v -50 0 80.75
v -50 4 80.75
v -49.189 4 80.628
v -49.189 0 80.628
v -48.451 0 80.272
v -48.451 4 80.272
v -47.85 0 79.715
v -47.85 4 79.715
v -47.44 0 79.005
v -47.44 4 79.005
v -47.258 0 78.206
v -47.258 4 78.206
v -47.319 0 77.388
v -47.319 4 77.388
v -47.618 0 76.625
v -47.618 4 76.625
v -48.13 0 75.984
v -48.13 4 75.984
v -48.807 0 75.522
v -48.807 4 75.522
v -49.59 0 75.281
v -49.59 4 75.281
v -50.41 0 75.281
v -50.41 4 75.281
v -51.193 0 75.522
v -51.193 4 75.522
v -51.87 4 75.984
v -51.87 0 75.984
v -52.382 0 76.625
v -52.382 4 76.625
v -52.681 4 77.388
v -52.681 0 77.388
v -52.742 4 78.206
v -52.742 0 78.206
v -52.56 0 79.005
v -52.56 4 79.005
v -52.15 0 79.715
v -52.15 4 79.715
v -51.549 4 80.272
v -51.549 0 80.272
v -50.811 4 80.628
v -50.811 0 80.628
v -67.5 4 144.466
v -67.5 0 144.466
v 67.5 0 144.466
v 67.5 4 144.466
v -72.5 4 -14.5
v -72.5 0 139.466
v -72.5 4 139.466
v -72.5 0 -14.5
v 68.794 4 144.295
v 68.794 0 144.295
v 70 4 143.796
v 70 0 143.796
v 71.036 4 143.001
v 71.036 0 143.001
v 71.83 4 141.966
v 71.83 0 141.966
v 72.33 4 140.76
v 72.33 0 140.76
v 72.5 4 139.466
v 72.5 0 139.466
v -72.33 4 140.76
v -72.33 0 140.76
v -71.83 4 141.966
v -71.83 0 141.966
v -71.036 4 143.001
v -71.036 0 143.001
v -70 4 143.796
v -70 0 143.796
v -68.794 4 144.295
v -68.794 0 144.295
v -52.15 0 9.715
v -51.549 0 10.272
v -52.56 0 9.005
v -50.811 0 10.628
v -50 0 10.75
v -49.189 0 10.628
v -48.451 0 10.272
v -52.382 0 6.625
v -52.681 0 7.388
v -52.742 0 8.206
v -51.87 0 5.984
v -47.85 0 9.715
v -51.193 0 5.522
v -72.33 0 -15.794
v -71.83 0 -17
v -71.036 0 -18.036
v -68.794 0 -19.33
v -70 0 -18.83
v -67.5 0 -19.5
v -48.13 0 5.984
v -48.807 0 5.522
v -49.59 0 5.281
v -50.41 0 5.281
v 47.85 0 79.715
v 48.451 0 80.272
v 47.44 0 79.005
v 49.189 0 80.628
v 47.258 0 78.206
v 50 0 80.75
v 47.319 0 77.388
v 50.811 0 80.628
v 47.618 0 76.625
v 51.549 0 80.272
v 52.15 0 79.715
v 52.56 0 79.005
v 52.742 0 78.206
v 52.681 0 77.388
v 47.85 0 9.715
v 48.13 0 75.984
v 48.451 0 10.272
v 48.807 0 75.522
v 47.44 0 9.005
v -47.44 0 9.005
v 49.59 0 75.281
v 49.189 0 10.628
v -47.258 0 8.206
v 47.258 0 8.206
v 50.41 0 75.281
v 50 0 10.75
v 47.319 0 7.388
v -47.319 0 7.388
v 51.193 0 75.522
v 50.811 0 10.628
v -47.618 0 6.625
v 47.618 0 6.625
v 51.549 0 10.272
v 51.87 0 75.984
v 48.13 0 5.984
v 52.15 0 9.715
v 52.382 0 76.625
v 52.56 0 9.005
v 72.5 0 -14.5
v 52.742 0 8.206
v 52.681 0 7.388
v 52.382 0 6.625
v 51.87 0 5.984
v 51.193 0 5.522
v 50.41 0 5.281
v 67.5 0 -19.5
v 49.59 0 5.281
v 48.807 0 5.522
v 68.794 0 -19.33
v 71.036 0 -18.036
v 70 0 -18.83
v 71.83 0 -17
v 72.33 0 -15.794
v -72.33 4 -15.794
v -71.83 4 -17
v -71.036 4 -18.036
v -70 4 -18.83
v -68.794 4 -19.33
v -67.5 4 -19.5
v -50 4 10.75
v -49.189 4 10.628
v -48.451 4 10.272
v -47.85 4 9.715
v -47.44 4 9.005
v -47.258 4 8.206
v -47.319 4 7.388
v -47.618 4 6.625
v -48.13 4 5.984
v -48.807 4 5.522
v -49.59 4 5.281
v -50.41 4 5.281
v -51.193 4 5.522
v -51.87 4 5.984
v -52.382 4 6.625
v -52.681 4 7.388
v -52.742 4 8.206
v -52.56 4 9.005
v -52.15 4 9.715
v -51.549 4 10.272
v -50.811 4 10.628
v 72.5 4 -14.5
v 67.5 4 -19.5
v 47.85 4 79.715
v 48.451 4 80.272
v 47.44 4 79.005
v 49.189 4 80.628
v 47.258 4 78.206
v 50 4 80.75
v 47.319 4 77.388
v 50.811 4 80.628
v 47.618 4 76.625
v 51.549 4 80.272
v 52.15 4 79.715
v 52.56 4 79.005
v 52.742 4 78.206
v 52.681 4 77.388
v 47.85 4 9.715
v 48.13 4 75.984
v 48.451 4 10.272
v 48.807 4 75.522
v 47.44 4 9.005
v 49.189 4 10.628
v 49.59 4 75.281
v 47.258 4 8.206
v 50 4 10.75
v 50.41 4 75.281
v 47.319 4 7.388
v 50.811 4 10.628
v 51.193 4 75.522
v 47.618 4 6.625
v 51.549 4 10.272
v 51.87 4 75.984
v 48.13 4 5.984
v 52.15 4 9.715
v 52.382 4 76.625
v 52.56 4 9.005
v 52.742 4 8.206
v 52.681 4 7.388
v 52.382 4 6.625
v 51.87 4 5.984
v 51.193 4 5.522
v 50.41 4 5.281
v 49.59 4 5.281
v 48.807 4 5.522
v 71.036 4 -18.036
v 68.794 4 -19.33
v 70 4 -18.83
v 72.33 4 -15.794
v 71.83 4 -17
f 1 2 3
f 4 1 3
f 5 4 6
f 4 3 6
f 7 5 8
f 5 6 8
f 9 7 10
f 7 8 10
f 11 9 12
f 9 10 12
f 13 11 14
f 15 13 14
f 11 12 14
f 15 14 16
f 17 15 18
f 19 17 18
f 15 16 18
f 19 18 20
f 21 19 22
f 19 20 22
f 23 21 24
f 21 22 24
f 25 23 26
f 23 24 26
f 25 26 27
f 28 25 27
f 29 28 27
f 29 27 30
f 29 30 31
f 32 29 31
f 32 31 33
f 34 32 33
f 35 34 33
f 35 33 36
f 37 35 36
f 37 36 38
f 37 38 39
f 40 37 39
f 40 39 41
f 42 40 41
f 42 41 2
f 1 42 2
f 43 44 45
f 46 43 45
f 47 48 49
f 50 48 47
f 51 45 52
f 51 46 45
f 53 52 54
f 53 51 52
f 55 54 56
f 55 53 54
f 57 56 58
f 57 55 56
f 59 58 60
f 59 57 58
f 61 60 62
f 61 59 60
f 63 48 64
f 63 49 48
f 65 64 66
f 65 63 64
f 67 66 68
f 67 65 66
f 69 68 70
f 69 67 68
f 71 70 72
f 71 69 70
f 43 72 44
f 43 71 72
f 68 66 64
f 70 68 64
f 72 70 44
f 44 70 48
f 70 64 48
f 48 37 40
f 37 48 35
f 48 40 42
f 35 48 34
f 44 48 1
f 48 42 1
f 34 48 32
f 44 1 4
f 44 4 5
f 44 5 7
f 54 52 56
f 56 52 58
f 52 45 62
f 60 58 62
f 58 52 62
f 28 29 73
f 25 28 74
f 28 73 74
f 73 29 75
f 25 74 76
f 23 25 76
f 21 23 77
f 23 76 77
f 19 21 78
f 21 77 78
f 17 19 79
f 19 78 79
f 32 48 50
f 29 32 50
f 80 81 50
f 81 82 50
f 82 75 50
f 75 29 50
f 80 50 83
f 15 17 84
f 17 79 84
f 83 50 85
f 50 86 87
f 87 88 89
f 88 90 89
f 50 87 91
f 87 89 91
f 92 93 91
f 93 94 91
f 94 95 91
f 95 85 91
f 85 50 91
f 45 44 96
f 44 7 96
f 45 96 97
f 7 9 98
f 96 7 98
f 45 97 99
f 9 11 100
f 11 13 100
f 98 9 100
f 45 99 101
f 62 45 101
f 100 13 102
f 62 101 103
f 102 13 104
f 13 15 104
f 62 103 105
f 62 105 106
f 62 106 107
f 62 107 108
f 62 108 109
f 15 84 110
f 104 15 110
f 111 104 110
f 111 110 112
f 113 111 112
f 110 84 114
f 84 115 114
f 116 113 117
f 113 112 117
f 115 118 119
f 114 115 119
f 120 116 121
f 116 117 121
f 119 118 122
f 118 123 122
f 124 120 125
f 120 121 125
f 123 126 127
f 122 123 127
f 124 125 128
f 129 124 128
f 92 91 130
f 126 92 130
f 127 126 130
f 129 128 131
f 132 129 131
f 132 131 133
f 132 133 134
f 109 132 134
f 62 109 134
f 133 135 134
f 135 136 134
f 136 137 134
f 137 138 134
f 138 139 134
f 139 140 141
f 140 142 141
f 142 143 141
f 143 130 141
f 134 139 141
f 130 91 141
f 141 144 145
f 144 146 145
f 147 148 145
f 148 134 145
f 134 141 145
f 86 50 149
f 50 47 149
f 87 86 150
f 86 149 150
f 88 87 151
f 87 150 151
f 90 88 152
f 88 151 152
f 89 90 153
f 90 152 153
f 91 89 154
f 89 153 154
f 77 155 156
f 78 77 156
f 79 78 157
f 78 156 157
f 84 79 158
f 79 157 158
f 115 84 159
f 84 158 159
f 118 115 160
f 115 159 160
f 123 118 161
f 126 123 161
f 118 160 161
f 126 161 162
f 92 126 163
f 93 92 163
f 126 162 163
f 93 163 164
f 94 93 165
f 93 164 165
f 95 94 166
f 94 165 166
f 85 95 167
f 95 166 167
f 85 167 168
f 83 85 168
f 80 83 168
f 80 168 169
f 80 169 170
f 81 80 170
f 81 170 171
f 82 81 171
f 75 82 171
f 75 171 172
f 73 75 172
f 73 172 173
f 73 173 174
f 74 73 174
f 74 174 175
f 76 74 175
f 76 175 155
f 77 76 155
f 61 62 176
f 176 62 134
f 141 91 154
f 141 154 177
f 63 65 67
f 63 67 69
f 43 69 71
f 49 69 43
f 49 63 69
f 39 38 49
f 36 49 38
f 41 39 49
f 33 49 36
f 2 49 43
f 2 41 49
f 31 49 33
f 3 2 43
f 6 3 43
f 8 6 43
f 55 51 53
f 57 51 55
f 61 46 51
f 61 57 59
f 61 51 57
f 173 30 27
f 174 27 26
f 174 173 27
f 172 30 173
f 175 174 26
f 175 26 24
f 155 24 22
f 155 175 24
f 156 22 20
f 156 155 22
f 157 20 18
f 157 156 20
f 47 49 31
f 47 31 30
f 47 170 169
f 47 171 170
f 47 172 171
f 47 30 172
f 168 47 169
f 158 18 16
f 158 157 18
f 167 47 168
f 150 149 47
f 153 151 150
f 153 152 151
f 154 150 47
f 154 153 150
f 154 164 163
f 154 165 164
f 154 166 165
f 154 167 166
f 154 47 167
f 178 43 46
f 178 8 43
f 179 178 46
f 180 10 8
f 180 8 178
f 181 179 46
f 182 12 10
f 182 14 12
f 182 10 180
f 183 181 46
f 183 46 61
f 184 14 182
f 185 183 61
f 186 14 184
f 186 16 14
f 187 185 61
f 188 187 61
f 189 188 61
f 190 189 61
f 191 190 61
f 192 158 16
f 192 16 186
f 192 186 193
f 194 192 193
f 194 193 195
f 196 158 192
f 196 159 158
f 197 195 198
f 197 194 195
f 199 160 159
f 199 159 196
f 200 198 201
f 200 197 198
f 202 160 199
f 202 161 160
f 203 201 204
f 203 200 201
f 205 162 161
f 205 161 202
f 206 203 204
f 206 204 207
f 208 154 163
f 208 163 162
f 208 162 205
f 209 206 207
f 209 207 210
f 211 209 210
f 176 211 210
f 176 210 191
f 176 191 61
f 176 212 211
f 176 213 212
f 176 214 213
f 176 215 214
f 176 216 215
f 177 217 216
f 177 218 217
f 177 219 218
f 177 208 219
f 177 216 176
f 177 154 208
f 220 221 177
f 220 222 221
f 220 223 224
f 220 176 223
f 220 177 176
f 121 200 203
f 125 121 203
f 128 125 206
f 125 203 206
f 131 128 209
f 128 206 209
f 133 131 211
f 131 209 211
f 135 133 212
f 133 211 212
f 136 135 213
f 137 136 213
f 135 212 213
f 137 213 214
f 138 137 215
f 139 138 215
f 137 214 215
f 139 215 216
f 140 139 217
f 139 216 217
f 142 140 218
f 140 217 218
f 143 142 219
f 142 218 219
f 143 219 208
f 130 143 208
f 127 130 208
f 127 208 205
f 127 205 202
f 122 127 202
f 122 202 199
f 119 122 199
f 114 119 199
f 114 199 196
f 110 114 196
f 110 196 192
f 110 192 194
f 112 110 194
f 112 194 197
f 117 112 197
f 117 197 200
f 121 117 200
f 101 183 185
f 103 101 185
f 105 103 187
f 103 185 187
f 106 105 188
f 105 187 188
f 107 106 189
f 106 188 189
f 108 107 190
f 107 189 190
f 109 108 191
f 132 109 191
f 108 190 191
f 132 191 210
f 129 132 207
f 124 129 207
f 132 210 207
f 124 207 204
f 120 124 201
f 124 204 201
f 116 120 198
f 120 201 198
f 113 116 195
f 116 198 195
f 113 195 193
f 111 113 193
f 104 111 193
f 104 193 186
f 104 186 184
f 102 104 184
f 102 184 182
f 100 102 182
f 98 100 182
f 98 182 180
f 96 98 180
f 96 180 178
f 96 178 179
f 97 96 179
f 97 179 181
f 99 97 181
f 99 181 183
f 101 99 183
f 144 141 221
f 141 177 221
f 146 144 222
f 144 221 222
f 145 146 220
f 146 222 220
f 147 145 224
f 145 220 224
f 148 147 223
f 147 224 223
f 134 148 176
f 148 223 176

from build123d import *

# Parameters (mm, degrees)
SKETCH_1_W          = 145
SKETCH_1_H          = 163.96571483
F_145X120X4MM_DEPTH = 4
SKETCH_2_R          = 2.75
M3_90X70MM_DEPTH    = 162.686711765
FILLET_R5_R         = 5


with BuildPart() as part:
    # 草图1 → 承托板_145x120x4mm (new body)
    with BuildSketch(Plane(origin=(0, 0, 0), x_dir=(1, 0, 0), z_dir=(0, 1, 0))):
        with Locations((0, -62.482857415)):
            Rectangle(SKETCH_1_W, SKETCH_1_H)
    extrude(amount=F_145X120X4MM_DEPTH)

    # 草图2 → 四个M3连接孔_90x70mm (cut, through all)
    with BuildSketch(Plane(origin=(0, 4, 0), x_dir=(1, 0, 0), z_dir=(0, 1, 0))):
        with Locations(Location((-50, -8, 0), (0, 0, 270))):
            Circle(SKETCH_2_R)
        with Locations(Location((-50, -78, 0), (0, 0, 270))):
            Circle(SKETCH_2_R)
        with Locations(Location((50, -8, 0), (0, 0, 270))):
            Circle(SKETCH_2_R)
        with Locations(Location((50, -78, 0), (0, 0, 270))):
            Circle(SKETCH_2_R)
    extrude(amount=-M3_90X70MM_DEPTH, mode=Mode.SUBTRACT)

    # 四角圆角_R5
    fillet_r5_edges = [part.edges().sort_by_distance(p)[0] for p in [
        (-72.5, 2, -19.5),
        (72.5, 2, -19.5),
        (72.5, 2, 144.46571483),
        (-72.5, 2, 144.46571483),
    ]]
    fillet(fillet_r5_edges, radius=FILLET_R5_R)


solid = part.part
